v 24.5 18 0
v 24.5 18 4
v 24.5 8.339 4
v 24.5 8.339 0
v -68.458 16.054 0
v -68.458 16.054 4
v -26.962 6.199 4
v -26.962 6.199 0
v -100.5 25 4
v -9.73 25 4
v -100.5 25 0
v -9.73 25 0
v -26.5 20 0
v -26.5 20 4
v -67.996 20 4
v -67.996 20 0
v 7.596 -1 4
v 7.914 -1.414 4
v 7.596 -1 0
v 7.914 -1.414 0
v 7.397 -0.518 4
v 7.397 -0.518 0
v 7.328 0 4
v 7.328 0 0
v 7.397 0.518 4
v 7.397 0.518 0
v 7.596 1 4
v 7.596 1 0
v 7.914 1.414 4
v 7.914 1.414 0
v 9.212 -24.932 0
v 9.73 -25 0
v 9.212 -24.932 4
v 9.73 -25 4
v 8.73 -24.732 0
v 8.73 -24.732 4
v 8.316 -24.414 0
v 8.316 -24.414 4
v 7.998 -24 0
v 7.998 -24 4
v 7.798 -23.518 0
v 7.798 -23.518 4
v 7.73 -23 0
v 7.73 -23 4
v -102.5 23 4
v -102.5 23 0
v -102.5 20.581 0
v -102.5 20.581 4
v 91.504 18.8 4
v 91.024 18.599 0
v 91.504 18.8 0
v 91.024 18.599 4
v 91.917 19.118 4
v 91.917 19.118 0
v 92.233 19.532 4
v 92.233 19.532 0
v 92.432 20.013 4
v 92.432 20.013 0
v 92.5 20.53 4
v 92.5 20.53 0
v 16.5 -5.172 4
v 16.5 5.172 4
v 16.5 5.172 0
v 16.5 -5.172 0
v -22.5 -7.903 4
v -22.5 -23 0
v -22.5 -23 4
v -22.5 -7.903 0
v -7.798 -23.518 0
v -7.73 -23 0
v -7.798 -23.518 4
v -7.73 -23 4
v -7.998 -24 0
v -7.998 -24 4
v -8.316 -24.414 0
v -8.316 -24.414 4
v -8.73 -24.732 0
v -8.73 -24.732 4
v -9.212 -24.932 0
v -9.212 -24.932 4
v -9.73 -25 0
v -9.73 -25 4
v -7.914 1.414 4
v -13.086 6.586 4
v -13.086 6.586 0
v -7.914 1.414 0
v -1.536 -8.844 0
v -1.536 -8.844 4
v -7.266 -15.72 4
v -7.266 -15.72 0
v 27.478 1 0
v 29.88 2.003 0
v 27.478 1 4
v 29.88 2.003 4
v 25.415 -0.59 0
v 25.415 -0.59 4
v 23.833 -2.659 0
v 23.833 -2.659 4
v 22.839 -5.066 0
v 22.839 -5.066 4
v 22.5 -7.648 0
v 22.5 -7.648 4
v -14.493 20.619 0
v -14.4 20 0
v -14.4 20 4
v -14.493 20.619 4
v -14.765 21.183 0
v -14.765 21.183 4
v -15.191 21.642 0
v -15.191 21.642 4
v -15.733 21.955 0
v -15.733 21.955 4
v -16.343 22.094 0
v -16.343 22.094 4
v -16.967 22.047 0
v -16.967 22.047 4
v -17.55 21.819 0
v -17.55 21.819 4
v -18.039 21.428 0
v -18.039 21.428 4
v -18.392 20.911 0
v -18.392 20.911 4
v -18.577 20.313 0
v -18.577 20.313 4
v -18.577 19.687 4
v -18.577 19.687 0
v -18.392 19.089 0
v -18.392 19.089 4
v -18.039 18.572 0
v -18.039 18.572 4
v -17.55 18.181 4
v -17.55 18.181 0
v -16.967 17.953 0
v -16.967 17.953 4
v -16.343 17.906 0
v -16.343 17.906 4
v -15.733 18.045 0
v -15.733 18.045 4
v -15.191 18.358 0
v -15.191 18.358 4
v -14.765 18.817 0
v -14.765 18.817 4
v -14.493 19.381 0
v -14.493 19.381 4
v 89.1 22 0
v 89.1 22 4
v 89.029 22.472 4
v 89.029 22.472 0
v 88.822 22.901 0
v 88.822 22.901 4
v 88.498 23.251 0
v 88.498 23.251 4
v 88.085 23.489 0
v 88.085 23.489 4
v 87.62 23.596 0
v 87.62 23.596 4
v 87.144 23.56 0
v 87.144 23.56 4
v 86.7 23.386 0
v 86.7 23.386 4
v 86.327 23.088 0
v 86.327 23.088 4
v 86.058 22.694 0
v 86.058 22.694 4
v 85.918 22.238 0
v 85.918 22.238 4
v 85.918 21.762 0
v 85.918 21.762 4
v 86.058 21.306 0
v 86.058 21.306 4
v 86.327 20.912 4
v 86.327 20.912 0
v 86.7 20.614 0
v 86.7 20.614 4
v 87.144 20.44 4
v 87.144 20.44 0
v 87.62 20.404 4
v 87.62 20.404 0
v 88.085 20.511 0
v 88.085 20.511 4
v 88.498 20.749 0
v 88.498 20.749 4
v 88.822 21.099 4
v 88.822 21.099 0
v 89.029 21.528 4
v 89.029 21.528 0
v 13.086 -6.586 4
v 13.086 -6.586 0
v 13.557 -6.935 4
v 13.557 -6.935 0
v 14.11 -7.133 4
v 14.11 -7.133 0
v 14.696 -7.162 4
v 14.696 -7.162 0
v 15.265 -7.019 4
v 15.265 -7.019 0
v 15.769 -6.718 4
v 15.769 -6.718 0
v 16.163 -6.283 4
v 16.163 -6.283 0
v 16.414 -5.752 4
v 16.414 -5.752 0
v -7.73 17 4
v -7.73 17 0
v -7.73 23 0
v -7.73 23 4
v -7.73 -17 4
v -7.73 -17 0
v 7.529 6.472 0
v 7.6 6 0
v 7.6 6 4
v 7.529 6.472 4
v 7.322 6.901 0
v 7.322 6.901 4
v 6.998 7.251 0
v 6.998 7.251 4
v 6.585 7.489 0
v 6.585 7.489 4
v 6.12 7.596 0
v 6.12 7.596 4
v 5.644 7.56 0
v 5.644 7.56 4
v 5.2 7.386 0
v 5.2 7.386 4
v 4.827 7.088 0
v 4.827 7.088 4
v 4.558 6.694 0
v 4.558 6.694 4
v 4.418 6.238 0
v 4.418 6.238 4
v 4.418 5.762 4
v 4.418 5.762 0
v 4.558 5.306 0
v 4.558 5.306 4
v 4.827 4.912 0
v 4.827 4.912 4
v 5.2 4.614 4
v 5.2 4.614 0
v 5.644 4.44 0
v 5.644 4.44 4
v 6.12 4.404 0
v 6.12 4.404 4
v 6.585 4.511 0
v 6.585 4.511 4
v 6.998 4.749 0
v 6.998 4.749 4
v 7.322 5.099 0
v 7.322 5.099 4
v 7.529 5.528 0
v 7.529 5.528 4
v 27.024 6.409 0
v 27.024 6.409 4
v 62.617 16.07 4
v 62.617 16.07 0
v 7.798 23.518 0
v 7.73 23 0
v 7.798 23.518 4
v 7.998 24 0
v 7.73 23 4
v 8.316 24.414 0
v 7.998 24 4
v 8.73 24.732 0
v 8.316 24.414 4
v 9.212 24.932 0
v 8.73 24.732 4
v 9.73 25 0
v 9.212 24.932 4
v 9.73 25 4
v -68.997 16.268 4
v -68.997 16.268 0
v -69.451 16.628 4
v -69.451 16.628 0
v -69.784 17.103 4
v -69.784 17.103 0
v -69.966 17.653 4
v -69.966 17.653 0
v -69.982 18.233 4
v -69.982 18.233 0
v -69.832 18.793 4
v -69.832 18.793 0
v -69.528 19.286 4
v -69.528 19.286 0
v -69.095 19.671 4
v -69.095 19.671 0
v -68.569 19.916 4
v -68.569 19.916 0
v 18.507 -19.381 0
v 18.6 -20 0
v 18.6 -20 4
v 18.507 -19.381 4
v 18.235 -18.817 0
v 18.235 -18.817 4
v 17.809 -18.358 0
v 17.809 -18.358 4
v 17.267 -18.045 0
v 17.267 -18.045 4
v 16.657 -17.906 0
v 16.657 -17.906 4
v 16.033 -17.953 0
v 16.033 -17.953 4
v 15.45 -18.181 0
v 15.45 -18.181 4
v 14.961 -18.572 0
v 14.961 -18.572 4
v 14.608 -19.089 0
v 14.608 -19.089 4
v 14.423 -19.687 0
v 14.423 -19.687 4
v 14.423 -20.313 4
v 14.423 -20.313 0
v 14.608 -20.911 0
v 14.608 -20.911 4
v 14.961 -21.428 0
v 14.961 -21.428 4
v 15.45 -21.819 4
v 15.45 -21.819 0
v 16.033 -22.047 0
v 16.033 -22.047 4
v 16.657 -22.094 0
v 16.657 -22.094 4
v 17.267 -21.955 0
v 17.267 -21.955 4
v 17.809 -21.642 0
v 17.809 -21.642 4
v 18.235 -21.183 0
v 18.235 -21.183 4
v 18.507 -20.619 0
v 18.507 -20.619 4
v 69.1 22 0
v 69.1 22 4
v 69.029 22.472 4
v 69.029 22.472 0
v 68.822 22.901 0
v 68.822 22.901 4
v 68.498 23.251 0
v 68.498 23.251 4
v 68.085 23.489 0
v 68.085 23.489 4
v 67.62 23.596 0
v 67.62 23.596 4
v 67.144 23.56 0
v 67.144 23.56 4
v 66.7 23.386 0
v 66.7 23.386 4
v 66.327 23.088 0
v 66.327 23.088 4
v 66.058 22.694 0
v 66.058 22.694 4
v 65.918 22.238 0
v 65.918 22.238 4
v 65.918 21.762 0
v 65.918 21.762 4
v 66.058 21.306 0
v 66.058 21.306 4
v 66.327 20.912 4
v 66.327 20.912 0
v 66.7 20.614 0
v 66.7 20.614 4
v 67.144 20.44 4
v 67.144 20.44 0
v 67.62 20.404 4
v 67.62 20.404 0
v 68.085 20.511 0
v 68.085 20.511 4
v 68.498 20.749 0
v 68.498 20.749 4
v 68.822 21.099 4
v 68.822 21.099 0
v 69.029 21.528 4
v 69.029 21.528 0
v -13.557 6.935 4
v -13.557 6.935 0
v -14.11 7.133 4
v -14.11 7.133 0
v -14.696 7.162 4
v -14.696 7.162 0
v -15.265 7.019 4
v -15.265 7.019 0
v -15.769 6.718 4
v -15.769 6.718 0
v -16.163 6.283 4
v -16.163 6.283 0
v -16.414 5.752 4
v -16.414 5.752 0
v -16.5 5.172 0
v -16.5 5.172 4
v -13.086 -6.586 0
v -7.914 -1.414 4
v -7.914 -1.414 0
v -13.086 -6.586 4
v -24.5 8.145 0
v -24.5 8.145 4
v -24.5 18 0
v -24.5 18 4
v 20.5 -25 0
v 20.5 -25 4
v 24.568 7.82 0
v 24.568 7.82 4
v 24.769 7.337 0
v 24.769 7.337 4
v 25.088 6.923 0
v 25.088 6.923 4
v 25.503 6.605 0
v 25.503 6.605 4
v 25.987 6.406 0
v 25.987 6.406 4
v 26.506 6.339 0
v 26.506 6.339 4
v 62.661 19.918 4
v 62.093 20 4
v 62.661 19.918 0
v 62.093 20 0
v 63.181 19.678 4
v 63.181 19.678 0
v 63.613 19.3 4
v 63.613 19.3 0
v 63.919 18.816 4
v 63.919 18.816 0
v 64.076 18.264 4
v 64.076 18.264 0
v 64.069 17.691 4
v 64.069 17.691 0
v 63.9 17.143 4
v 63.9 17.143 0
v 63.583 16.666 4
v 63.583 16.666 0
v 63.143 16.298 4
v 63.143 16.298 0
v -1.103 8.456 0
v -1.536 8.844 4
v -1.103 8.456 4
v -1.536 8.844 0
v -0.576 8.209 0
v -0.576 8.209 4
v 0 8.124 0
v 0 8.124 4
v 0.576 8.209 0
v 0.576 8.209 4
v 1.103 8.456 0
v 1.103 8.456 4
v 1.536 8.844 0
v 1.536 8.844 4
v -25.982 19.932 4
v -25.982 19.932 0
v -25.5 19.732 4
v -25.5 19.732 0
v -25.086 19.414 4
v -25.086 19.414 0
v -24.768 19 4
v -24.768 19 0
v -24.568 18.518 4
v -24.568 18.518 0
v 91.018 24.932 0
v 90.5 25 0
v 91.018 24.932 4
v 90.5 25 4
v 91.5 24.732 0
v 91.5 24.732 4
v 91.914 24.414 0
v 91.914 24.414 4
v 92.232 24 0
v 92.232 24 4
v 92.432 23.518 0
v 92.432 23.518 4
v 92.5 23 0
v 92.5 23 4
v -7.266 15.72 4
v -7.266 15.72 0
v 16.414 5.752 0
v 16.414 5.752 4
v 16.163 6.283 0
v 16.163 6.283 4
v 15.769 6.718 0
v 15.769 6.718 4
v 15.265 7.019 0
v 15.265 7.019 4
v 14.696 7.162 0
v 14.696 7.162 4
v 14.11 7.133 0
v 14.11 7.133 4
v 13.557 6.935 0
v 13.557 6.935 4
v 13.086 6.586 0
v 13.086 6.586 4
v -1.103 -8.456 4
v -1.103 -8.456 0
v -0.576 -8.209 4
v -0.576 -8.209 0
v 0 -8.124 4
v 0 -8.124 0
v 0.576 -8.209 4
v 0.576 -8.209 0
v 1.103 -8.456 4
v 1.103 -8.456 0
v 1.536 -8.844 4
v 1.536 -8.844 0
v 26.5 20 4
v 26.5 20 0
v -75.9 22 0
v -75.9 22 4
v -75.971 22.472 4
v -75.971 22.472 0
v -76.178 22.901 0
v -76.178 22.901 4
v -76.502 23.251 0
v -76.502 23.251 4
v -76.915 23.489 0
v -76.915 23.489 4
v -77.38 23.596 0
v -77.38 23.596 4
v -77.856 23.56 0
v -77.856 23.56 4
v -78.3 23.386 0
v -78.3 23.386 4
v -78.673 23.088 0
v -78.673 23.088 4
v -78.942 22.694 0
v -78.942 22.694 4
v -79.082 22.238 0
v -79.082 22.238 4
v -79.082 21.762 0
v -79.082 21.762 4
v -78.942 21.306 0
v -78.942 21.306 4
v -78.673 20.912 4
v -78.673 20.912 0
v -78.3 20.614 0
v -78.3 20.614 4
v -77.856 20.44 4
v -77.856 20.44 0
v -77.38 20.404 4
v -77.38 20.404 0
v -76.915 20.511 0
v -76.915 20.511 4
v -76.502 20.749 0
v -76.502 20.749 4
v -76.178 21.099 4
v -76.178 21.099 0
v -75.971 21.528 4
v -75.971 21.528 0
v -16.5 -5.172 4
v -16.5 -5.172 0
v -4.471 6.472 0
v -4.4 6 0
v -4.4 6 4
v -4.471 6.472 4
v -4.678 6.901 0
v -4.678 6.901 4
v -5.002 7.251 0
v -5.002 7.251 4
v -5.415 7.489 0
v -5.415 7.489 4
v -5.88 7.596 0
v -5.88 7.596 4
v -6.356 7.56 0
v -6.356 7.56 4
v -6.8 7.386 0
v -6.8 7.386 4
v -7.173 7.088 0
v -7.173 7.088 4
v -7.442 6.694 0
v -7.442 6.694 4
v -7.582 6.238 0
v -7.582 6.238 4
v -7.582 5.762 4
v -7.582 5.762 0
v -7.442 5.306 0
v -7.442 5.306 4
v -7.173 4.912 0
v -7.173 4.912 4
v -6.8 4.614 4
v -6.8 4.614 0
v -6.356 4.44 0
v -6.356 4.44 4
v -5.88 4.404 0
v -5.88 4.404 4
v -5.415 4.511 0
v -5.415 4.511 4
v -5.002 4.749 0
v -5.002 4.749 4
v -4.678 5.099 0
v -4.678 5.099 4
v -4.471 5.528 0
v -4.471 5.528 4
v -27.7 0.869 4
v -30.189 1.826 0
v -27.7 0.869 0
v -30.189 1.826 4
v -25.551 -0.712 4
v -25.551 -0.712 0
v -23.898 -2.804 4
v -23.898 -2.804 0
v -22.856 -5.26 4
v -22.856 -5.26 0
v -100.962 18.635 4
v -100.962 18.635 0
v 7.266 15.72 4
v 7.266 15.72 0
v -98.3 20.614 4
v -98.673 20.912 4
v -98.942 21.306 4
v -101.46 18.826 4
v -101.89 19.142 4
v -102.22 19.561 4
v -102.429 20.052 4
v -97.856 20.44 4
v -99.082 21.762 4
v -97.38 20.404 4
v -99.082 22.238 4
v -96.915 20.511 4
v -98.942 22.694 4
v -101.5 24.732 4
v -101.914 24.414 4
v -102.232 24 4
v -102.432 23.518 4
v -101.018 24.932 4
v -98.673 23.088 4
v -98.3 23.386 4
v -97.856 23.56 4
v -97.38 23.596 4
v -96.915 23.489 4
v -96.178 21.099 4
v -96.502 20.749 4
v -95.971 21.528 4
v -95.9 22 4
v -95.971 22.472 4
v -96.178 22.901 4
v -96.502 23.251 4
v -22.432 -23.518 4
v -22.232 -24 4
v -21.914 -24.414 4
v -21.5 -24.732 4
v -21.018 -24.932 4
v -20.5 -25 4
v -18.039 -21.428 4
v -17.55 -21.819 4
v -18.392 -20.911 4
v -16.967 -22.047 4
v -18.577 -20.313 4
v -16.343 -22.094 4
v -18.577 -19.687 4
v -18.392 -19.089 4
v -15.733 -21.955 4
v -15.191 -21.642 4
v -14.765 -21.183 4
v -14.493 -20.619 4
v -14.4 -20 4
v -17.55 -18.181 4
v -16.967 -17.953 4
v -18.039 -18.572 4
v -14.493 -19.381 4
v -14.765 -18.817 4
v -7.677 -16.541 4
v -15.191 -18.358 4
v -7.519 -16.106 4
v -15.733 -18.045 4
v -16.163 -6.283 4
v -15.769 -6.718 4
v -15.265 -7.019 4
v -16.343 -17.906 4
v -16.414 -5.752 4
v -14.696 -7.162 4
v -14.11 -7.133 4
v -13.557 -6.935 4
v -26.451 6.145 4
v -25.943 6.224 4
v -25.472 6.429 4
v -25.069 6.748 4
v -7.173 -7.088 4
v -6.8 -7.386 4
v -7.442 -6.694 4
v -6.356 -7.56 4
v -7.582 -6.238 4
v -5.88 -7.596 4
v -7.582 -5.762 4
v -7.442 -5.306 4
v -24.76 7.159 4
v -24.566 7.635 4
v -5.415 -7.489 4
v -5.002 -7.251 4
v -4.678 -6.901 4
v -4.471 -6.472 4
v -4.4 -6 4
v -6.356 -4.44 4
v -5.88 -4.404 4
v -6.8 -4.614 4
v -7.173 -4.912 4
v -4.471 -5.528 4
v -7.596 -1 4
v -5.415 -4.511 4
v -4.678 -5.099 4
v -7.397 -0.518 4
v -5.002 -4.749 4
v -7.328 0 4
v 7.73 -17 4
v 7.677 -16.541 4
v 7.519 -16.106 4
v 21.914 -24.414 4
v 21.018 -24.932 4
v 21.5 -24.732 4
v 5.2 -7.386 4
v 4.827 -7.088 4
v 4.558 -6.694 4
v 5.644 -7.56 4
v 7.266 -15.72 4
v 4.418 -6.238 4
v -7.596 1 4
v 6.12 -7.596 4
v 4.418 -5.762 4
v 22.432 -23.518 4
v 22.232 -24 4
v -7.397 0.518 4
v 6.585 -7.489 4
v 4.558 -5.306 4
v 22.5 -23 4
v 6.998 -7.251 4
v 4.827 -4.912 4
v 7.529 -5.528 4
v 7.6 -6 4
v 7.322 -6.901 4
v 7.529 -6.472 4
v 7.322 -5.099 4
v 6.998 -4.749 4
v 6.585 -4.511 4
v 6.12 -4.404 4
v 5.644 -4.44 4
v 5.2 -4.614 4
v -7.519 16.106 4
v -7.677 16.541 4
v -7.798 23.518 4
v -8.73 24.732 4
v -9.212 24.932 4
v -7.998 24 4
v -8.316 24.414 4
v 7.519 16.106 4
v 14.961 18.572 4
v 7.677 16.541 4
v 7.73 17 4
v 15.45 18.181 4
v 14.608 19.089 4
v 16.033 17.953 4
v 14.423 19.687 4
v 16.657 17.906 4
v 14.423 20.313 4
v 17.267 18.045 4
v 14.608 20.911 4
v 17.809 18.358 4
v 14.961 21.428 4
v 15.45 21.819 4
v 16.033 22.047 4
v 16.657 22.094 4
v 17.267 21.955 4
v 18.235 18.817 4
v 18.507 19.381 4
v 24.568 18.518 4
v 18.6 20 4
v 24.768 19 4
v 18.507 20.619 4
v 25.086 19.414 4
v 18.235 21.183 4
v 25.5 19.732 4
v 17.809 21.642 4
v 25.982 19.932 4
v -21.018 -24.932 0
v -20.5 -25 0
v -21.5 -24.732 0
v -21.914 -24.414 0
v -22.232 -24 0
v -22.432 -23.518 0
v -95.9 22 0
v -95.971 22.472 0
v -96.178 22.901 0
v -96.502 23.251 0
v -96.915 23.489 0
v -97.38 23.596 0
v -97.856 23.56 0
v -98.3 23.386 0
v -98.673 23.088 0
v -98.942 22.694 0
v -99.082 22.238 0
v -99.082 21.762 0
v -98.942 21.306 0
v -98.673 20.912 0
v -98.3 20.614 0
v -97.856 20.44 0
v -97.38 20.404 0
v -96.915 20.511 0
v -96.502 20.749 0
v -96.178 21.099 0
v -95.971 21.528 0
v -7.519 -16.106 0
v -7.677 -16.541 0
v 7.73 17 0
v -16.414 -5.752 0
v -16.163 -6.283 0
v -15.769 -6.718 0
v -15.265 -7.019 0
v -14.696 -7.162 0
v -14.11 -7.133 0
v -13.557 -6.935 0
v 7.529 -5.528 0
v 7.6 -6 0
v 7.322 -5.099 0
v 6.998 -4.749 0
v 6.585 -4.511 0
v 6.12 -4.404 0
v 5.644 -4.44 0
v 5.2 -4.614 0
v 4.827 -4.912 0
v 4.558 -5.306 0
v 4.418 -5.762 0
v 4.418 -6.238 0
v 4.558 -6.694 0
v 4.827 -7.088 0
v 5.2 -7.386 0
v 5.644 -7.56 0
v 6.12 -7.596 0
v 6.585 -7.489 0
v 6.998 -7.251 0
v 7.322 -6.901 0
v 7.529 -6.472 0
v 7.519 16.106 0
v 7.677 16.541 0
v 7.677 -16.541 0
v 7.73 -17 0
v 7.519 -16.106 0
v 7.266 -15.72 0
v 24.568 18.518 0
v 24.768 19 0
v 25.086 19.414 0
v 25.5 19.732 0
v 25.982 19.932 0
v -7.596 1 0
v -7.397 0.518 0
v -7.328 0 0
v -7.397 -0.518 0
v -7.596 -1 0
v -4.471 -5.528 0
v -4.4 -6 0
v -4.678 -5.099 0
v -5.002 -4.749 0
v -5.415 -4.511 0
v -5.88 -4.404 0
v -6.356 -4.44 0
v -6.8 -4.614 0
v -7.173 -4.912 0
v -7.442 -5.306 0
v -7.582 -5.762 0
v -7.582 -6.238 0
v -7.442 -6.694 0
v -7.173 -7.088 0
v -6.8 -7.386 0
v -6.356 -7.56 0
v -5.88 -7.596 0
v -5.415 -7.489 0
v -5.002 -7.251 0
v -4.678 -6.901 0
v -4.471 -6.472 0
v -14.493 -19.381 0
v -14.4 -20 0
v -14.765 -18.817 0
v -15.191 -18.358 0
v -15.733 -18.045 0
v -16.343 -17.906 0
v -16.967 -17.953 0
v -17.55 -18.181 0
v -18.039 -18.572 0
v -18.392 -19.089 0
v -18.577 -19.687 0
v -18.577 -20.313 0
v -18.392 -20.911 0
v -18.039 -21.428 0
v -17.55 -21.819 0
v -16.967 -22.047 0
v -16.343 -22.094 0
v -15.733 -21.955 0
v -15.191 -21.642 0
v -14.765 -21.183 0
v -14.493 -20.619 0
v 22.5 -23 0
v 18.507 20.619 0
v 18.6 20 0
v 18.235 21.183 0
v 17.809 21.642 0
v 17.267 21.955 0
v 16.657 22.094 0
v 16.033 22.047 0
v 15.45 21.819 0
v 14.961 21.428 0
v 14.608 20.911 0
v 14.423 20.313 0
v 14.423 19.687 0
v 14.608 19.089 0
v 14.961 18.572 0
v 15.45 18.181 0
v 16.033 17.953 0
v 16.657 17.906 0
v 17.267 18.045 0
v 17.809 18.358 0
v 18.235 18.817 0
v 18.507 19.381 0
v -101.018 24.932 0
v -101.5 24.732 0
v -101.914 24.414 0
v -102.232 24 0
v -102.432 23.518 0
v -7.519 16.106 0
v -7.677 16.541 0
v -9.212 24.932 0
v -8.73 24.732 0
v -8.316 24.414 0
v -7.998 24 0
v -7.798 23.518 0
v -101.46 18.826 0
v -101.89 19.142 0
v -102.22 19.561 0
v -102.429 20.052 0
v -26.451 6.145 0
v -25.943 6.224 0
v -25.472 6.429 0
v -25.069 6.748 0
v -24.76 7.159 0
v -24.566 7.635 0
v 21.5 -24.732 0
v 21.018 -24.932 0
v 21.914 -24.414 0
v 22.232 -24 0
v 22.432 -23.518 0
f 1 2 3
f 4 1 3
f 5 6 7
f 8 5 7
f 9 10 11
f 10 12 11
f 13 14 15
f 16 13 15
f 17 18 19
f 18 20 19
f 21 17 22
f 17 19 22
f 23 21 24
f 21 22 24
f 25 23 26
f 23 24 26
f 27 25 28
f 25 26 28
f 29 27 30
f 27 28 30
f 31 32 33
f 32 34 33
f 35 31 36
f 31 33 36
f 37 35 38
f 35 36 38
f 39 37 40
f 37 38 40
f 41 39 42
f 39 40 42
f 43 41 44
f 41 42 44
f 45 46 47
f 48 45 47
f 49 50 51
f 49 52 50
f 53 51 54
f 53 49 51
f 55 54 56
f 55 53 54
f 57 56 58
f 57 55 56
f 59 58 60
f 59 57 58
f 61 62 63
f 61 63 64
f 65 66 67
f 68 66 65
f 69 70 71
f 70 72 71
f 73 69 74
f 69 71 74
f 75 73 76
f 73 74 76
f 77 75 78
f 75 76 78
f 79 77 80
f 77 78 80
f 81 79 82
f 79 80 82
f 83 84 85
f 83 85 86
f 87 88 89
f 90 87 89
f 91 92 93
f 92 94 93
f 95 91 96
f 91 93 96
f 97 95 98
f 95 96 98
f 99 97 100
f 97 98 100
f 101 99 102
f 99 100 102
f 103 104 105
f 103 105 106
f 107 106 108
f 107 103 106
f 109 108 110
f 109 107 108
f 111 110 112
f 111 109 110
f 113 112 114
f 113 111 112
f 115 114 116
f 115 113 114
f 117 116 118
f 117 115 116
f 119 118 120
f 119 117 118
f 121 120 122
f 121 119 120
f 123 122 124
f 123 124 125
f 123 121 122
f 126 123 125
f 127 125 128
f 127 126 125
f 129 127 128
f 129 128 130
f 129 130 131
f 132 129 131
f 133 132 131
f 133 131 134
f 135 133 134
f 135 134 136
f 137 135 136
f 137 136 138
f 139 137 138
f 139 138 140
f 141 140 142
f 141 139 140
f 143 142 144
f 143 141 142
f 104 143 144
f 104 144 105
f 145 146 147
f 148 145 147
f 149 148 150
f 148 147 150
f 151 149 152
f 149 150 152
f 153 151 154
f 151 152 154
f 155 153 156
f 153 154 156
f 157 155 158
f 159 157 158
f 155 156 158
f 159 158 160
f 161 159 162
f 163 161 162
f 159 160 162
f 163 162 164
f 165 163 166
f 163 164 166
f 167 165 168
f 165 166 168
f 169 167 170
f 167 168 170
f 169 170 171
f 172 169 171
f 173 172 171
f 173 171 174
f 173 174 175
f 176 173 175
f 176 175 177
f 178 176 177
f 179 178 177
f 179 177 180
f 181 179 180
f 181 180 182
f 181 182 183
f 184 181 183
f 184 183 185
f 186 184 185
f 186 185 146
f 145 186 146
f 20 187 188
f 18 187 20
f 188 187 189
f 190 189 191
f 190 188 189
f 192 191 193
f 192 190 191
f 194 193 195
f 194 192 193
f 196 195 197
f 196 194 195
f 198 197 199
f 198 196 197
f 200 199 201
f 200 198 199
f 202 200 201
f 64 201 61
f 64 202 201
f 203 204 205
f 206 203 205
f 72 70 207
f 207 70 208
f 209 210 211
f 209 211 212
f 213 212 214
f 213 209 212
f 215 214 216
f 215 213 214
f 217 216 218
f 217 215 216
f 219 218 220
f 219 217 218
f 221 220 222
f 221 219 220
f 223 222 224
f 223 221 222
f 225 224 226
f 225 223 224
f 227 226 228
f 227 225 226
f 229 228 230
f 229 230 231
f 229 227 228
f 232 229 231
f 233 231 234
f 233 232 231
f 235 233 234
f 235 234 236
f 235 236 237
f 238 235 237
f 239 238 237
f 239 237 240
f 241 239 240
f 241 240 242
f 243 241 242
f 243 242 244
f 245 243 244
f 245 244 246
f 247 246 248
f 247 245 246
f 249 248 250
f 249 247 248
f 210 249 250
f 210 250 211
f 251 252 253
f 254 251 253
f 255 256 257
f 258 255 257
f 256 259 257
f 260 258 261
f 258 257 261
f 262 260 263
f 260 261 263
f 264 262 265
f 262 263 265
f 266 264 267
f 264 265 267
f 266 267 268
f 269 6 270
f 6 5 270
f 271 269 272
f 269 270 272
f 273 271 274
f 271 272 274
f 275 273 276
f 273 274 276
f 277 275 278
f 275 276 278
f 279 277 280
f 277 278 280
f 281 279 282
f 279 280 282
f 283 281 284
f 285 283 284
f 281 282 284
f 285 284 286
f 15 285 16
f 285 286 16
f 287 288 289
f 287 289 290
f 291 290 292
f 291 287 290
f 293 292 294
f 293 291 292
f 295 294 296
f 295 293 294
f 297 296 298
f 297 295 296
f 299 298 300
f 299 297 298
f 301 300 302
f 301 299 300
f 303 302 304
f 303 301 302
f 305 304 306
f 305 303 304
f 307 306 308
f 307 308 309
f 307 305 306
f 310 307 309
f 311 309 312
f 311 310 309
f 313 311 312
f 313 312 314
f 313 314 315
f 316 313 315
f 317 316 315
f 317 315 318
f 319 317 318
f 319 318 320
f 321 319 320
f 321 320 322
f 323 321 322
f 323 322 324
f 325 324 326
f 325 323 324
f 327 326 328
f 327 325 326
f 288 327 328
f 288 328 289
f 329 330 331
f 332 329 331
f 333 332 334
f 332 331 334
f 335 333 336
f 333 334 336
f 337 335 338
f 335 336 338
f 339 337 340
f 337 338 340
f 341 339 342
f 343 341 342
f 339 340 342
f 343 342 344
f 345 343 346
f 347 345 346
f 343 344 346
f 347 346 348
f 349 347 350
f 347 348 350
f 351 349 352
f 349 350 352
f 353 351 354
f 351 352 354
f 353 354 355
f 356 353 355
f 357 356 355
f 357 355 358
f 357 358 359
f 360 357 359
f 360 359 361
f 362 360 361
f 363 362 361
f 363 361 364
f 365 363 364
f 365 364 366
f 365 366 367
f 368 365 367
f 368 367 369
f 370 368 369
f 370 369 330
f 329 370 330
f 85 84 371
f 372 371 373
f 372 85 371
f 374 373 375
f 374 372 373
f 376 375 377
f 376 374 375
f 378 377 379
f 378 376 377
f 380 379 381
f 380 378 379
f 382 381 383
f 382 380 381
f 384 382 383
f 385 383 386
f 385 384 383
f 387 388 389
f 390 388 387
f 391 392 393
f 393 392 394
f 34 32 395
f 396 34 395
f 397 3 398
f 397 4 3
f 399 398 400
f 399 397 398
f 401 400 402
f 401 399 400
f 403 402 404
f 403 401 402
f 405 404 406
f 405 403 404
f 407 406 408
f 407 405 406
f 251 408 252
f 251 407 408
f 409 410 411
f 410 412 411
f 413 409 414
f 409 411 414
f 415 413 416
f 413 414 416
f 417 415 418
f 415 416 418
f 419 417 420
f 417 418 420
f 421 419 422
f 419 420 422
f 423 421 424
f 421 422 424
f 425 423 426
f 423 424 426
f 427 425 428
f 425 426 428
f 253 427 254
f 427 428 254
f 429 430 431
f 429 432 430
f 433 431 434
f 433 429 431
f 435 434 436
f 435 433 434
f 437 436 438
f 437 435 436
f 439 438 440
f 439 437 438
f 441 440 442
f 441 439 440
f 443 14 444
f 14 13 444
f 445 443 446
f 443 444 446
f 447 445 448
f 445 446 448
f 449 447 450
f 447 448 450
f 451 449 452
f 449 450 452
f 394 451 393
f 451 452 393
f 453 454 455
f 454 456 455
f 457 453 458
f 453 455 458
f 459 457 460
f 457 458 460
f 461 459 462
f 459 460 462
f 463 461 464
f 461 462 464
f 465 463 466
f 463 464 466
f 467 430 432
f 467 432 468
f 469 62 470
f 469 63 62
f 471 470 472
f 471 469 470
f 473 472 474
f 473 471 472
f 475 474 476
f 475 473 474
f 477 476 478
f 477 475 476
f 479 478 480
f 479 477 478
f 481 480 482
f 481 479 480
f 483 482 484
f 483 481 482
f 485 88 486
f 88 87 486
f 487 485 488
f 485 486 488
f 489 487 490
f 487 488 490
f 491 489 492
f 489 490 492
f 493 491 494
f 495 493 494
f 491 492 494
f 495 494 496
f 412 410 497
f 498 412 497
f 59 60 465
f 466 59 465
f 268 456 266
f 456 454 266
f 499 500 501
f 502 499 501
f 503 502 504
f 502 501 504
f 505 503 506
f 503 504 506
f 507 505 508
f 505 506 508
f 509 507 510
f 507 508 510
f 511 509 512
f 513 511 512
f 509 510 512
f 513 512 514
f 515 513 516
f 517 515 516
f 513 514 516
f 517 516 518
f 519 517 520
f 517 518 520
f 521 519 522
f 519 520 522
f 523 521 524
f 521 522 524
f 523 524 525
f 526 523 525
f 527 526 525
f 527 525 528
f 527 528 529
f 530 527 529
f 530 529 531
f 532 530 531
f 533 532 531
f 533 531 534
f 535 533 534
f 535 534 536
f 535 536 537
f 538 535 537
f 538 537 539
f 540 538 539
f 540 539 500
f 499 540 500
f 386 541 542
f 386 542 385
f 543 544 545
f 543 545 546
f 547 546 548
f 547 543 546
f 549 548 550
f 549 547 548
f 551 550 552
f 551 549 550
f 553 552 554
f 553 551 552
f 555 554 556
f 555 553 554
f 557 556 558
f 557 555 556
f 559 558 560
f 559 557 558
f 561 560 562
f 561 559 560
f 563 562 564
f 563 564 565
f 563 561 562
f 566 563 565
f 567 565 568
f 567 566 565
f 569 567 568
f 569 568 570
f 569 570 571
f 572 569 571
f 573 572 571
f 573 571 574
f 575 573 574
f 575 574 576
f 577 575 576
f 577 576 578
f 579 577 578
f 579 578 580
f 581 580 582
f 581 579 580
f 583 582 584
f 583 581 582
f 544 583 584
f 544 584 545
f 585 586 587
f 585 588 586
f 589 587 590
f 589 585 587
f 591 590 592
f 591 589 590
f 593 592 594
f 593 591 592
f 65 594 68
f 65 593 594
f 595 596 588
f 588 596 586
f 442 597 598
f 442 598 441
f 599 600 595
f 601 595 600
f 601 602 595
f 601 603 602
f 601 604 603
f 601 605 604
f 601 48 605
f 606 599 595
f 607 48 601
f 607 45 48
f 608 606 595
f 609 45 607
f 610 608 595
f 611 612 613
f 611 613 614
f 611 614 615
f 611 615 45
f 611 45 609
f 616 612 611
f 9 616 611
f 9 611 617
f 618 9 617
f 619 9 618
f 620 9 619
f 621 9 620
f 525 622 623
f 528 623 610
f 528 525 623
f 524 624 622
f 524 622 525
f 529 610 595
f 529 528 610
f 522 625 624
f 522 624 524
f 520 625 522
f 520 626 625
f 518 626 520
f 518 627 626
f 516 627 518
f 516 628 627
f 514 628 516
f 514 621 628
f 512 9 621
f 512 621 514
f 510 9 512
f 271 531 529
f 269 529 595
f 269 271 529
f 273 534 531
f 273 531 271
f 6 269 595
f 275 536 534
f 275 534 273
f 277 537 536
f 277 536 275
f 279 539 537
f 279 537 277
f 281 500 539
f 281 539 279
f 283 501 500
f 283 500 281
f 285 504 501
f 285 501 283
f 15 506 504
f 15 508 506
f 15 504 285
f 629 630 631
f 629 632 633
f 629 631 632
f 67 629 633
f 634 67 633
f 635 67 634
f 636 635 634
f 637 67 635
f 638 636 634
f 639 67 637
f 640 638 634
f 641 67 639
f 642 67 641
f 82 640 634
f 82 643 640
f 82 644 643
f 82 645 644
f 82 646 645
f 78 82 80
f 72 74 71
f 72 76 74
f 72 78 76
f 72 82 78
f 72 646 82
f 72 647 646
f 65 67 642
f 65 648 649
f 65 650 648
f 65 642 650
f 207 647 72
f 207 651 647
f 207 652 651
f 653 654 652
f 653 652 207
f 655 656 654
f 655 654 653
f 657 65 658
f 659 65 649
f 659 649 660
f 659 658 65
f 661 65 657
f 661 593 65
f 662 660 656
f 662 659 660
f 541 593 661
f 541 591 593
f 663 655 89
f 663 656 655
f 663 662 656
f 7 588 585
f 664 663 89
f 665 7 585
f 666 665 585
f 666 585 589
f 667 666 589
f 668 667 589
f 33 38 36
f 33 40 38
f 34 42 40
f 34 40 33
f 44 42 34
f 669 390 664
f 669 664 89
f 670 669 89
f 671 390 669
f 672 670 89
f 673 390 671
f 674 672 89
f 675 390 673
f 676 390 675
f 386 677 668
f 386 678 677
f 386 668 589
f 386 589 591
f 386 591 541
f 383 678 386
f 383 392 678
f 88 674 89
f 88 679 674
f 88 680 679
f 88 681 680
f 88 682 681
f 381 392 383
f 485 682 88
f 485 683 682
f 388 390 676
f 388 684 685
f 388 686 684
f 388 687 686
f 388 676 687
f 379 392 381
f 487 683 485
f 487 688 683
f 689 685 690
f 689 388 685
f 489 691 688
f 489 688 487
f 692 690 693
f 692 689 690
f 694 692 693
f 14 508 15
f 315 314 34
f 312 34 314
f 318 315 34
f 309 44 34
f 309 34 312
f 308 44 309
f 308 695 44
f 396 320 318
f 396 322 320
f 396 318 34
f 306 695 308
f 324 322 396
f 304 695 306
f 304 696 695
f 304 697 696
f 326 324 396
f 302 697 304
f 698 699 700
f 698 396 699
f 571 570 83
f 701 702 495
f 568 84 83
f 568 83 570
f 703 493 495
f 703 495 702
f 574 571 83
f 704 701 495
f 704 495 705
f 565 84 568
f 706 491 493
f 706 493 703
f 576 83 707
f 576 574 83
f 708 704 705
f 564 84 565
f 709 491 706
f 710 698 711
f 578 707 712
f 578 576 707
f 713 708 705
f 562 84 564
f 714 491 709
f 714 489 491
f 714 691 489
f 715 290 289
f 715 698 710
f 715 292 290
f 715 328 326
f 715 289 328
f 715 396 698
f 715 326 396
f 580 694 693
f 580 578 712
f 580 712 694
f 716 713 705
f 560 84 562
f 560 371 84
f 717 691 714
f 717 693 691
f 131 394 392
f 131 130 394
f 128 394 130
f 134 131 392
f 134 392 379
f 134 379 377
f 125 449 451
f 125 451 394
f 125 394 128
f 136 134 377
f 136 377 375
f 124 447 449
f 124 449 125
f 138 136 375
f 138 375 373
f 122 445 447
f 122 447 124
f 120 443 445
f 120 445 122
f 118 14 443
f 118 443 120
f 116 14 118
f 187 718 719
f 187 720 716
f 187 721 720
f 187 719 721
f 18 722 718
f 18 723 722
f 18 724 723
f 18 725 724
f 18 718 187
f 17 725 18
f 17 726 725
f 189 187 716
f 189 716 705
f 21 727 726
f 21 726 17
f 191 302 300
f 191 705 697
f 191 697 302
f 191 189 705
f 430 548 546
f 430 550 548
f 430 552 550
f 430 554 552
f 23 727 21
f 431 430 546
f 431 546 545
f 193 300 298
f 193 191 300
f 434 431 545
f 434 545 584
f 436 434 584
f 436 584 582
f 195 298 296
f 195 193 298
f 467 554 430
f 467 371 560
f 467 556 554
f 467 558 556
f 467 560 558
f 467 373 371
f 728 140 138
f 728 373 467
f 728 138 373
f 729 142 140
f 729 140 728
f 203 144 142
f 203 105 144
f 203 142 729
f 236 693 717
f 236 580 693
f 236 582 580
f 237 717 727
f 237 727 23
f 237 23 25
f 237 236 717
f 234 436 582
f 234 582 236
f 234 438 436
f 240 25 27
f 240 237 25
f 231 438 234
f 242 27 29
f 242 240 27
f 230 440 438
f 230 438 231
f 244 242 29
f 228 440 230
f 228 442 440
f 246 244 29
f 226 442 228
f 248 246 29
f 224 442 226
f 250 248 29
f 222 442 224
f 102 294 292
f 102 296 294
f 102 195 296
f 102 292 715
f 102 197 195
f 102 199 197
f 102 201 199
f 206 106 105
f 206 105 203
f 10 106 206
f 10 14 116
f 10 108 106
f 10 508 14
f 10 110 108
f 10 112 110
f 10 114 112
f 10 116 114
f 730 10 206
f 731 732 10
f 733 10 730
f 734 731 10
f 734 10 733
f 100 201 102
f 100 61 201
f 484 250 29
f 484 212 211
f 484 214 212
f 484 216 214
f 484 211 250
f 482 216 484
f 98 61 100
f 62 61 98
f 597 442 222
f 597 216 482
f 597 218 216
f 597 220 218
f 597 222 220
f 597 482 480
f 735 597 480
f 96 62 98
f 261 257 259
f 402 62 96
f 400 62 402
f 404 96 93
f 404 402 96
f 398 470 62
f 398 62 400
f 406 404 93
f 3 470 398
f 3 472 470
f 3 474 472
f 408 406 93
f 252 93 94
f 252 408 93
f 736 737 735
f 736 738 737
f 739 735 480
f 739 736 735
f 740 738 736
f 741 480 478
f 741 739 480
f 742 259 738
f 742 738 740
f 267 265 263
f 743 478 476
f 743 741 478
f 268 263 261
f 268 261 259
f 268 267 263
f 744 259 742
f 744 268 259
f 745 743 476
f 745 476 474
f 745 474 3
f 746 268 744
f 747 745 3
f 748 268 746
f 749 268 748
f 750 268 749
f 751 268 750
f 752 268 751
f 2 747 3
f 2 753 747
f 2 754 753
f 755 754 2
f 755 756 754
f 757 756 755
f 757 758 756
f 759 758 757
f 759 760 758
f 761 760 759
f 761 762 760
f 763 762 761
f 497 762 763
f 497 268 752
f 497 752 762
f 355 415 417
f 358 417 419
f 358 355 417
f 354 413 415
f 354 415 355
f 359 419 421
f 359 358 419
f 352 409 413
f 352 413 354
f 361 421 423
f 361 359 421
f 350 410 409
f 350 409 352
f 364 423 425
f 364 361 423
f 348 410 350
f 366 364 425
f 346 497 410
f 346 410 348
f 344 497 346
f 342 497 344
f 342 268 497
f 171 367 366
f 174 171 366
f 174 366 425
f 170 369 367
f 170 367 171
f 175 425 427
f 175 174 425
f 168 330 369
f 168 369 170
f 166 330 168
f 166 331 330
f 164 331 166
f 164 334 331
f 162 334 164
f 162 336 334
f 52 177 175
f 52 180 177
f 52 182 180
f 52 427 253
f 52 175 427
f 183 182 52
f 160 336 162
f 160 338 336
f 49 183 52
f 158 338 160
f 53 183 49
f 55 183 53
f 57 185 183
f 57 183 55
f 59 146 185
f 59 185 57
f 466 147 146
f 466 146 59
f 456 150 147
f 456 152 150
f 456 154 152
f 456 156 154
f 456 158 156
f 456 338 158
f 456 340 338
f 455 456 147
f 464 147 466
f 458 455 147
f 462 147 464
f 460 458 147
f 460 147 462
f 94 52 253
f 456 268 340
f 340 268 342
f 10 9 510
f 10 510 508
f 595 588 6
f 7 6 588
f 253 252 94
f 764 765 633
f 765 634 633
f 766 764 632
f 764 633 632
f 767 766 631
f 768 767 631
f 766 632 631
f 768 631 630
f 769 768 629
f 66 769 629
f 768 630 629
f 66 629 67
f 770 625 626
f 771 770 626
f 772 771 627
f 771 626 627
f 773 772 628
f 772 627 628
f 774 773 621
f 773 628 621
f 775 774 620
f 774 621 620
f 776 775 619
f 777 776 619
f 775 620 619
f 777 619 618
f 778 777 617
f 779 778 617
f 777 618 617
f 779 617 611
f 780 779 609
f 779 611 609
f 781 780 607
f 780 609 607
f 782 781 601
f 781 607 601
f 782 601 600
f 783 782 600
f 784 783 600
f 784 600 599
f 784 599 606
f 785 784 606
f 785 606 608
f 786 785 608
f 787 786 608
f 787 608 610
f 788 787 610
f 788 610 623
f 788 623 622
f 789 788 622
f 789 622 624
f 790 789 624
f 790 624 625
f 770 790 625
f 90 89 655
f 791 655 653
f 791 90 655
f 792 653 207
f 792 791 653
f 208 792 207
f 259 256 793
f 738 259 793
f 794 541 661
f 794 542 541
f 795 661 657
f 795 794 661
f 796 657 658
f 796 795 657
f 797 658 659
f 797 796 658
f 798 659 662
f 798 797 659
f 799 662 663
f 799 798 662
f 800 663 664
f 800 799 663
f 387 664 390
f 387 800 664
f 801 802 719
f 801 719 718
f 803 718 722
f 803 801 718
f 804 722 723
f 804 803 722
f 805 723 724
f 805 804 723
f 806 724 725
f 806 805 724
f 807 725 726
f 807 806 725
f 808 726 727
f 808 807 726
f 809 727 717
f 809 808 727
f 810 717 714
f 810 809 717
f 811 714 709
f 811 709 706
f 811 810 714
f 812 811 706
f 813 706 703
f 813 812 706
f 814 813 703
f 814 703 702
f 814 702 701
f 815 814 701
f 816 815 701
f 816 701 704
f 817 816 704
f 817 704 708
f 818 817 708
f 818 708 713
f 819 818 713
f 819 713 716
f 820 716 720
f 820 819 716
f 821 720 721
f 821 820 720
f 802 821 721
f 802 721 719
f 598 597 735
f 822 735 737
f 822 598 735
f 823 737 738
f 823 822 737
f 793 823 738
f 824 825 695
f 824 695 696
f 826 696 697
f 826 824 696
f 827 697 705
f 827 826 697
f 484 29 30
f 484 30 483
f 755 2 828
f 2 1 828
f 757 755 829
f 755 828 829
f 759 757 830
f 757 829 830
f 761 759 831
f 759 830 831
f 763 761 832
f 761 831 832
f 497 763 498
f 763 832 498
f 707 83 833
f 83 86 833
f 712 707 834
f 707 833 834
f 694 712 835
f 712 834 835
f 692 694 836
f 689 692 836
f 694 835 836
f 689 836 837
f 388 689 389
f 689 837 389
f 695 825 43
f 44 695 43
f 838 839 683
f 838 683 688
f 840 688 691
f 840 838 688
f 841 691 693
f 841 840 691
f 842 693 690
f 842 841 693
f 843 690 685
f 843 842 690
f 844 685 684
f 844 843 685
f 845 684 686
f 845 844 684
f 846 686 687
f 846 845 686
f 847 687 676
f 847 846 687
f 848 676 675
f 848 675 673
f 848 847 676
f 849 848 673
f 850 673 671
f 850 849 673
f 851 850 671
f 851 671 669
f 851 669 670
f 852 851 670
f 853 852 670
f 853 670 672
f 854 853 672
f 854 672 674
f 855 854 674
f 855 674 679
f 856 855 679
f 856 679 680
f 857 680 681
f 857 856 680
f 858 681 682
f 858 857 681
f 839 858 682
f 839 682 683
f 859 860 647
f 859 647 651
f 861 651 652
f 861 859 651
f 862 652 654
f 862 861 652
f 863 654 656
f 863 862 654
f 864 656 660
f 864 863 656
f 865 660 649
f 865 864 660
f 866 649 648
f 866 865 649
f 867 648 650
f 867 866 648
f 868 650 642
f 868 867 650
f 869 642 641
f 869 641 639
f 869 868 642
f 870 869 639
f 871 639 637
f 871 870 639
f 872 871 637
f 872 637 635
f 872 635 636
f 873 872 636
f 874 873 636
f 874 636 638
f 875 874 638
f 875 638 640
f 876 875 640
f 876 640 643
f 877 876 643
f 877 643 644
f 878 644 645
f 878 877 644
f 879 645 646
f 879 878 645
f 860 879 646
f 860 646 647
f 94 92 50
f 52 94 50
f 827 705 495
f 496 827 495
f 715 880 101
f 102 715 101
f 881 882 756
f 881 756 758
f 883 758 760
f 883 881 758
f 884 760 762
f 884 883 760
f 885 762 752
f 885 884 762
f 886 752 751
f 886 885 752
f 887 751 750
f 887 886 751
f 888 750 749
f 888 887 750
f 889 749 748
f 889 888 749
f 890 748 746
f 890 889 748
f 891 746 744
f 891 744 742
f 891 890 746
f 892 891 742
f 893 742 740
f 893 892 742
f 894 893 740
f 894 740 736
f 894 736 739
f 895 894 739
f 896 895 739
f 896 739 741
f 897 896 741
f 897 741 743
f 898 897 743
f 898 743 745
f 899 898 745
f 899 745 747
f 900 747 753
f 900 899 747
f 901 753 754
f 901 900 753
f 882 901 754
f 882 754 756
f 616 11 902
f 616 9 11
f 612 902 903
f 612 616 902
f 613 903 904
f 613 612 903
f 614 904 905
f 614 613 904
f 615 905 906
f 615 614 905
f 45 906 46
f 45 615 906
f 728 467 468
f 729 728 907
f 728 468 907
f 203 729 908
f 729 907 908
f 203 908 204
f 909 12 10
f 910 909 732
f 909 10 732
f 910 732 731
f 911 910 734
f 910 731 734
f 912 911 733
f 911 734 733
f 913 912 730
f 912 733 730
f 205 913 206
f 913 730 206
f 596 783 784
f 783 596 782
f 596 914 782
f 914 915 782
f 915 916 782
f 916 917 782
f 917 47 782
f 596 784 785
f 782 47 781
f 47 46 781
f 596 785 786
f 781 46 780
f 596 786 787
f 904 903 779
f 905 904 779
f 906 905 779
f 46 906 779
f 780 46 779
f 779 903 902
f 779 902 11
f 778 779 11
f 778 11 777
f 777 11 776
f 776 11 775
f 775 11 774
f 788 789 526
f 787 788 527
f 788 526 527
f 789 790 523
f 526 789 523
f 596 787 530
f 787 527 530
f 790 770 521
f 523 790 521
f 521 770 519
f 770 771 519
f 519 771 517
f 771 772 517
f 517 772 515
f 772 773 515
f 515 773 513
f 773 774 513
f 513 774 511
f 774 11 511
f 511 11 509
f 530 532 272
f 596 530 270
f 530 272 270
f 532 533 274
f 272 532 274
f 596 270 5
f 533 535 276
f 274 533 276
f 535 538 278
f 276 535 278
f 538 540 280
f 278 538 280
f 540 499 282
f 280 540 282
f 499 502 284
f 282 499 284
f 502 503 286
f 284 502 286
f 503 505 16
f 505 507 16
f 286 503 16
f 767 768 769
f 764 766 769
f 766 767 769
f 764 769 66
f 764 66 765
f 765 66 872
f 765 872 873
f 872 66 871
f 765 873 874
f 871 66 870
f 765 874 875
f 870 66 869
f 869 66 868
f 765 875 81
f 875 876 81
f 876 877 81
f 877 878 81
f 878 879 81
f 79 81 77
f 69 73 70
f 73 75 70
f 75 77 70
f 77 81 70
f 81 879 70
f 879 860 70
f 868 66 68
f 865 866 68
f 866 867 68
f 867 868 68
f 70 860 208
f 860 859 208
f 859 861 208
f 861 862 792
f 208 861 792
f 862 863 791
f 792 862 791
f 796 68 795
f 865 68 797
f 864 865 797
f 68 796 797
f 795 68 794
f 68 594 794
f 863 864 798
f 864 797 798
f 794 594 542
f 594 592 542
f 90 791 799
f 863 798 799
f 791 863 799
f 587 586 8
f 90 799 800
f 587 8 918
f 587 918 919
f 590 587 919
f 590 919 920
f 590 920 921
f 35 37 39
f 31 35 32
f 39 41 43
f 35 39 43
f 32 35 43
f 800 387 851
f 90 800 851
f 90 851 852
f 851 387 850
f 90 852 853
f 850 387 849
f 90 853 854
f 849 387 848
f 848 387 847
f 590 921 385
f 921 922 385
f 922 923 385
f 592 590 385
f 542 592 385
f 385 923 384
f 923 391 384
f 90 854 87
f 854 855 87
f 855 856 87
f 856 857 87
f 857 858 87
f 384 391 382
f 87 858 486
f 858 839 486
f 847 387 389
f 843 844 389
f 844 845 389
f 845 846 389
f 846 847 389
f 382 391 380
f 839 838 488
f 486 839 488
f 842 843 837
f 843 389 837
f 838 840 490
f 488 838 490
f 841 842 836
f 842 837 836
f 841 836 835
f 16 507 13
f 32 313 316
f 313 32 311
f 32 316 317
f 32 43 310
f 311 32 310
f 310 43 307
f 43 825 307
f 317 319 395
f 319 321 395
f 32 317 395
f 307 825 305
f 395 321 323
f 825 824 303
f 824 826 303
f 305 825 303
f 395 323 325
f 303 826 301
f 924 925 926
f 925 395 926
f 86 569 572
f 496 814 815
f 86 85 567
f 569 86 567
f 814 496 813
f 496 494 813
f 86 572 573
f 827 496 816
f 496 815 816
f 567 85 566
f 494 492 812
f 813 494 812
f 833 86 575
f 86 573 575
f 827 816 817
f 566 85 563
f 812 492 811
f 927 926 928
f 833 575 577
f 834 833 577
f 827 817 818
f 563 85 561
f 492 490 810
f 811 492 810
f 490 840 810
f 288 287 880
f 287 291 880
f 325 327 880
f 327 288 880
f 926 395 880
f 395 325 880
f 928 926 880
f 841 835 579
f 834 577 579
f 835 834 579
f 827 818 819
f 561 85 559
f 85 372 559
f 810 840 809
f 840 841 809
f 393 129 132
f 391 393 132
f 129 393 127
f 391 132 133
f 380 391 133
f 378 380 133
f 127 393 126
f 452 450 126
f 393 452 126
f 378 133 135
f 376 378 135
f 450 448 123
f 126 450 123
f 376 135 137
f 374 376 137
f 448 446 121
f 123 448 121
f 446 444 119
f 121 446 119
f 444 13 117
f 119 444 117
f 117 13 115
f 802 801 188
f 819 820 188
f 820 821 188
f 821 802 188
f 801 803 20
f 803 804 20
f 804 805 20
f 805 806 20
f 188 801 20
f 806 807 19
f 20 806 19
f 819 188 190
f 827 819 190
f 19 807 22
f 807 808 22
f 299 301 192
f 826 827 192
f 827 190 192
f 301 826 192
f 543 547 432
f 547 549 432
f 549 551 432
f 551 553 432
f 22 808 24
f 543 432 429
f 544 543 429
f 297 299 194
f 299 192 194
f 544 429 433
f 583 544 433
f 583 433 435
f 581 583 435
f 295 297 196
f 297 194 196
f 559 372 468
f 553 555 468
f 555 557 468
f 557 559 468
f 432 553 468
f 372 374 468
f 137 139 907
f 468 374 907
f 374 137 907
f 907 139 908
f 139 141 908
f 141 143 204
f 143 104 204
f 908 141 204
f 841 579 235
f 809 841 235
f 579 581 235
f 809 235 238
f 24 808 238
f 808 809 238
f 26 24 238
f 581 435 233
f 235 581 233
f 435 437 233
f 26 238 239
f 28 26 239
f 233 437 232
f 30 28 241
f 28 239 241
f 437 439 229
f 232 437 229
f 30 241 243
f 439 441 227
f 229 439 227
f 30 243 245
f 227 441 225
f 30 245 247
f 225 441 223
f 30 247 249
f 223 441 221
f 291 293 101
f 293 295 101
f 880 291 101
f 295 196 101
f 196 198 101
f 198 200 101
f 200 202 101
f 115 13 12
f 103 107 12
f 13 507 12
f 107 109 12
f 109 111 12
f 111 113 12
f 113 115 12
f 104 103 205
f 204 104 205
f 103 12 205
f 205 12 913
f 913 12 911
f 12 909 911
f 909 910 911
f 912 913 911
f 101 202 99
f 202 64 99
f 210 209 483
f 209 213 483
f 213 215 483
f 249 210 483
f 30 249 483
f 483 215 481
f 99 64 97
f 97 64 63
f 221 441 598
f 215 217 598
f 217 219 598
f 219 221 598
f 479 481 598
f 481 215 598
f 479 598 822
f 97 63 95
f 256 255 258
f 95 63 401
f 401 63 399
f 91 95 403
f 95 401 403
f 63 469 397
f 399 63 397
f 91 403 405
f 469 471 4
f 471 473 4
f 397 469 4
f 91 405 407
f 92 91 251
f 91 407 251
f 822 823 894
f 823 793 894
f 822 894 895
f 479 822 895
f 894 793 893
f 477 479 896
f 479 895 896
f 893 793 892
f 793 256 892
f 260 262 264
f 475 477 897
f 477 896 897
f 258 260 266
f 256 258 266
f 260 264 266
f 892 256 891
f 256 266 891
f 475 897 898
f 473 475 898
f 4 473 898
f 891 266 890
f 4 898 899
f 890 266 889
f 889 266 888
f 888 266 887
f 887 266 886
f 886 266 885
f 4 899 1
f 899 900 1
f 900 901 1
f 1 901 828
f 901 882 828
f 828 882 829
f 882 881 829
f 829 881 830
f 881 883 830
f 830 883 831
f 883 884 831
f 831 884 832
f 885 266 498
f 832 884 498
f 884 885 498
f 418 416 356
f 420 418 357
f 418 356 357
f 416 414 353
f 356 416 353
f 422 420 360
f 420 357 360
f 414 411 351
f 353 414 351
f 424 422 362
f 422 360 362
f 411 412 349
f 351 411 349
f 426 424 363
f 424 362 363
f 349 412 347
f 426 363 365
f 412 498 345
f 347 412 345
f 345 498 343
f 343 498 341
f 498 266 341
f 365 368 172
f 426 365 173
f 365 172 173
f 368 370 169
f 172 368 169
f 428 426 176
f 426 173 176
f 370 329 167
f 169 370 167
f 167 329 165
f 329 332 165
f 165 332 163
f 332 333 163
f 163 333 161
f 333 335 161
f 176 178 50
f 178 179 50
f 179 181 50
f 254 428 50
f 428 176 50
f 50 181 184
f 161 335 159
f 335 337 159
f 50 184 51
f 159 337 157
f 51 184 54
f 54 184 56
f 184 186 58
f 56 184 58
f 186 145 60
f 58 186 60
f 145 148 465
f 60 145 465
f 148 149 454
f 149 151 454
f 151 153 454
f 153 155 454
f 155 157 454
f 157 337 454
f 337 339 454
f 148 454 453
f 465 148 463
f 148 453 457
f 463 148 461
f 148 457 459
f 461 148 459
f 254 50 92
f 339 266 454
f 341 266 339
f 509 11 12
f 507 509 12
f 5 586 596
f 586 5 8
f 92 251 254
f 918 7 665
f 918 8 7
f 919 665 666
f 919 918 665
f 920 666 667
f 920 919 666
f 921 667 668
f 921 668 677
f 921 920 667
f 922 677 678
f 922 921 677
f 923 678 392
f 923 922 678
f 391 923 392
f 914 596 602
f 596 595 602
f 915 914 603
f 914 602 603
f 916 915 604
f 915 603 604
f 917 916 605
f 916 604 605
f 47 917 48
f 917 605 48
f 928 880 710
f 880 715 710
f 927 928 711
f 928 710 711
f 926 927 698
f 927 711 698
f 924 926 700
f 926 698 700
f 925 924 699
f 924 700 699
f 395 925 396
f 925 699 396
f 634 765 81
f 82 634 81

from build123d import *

# Parameters (mm, degrees)
SKETCH_1_W          = 45
SKETCH_1_H          = 50
SKETCH_1_R          = 1.6
SKETCH_1_R_2        = 2.1
EXTRUDE_1_DEPTH     = 4
FILLET_1_R          = 2
FILLET_2_R          = 10
CUT_EXTRUDE_1_DEPTH = 10
FILLET_3_R          = 2
SKETCH_3_W          = 5.729916775
SKETCH_3_H          = 6
CUT_EXTRUDE_2_DEPTH = 10
CUT_EXTRUDE_3_DEPTH = 10
FILLET_4_R          = 2
CUT_EXTRUDE_4_DEPTH = 10
FILLET_5_R          = 2
CUT_EXTRUDE_5_DEPTH = 10
SKETCH_8_R          = 1.6
CUT_EXTRUDE_6_DEPTH = 10
SKETCH_9_R          = 1.6
CUT_EXTRUDE_7_DEPTH = 10
FILLET_8_R          = 2


with BuildPart() as part:
    # 草图1 → 凸台-拉伸1 (new body)
    # profile 1 of 3: a face of its own
    with BuildSketch(Plane.XY):
        Polygon((-102.5, 25), (-102.5, 19), (-22.5, 0), (-22.5, 25), align=None)
    # profile 2 of 3: a face of its own
    with BuildSketch(Plane.XY):
        Rectangle(SKETCH_1_W, SKETCH_1_H)
        with Locations((-6, -6)):
            Circle(SKETCH_1_R, mode=Mode.SUBTRACT)
        with Locations((6, -6)):
            Circle(SKETCH_1_R, mode=Mode.SUBTRACT)
        with Locations((6, 6)):
            Circle(SKETCH_1_R, mode=Mode.SUBTRACT)
        with Locations((-6, 6)):
            Circle(SKETCH_1_R, mode=Mode.SUBTRACT)
        with Locations((-16.5, -20)):
            Circle(SKETCH_1_R_2, mode=Mode.SUBTRACT)
        with Locations((16.5, -20)):
            Circle(SKETCH_1_R_2, mode=Mode.SUBTRACT)
        with Locations((16.5, 20)):
            Circle(SKETCH_1_R_2, mode=Mode.SUBTRACT)
        with Locations((-16.5, 20)):
            Circle(SKETCH_1_R_2, mode=Mode.SUBTRACT)
    # profile 3 of 3: a face of its own
    with BuildSketch(Plane.XY):
        Polygon((92.5, 25), (22.5, 25), (22.5, 0), (92.5, 19), align=None)
    extrude(amount=EXTRUDE_1_DEPTH)

    # 圆角1
    fillet_1_edges = [part.edges().sort_by_distance(p)[0] for p in [
        (92.5, 25, 2),
        (92.5, 19, 2),
        (22.5, -25, 2),
        (-22.5, -25, 2),
        (-102.5, 19, 2),
        (-102.5, 25, 2),
    ]]
    fillet(fillet_1_edges, radius=FILLET_1_R)

    # 圆角2
    fillet_2_edges = [part.edges().sort_by_distance(p)[0] for p in [
        (22.5, 0, 2),
        (-22.5, 0, 2),
    ]]
    fillet(fillet_2_edges, radius=FILLET_2_R)

    # 草图2 → 切除-拉伸1 (cut)
    with BuildSketch(Plane.XY.offset(4)):
        Polygon((-10, 19), (10, 19), (0, 7), align=None)
        Polygon((0, -7), (-10, -19), (10, -19), align=None)
    extrude(amount=-CUT_EXTRUDE_1_DEPTH, mode=Mode.SUBTRACT)

    # 圆角3
    fillet_3_edges = [part.edges().sort_by_distance(p)[0] for p in [
        (0, 7, 2),
        (-10, 19, 2),
        (10, 19, 2),
        (10, -19, 2),
        (-10, -19, 2),
        (0, -7, 2),
    ]]
    fillet(fillet_3_edges, radius=FILLET_3_R)

    # 草图3 → 切除-拉伸2 (cut)
    with BuildSketch(Plane(origin=(0, 0, 0), x_dir=(-1, 0, 0), z_dir=(0, 0, -1))):
        with Locations((2.864958388, 22)):
            Rectangle(SKETCH_3_W, SKETCH_3_H)
        with Locations((-2.864958388, 22)):
            Rectangle(SKETCH_3_W, SKETCH_3_H)
        with Locations((2.864958388, -22)):
            Rectangle(SKETCH_3_W, SKETCH_3_H)
        with Locations((-2.864958388, -22)):
            Rectangle(SKETCH_3_W, SKETCH_3_H)
    extrude(amount=-CUT_EXTRUDE_2_DEPTH, mode=Mode.SUBTRACT)

    # 草图4 → 切除-拉伸3 (cut)
    with BuildSketch(Plane(origin=(0, 0, 0), x_dir=(-1, 0, 0), z_dir=(0, 0, -1))):
        with BuildLine():
            Line((-5.729916775, 25), (-7.729916775, 25))
            Line((-7.729916775, 25), (-7.729916775, 17))
            ThreePointArc((-7.729916775, 17), (-7.144130337, 18.414213562), (-5.729916775, 19))
            Line((-5.729916775, 19), (-5.729916775, 25))
        make_face()
        with BuildLine():
            Line((7.729916775, 25), (5.729916775, 25))
            Line((5.729916775, 25), (5.729916775, 19))
            ThreePointArc((5.729916775, 19), (7.144130337, 18.414213562), (7.729916775, 17))
            Line((7.729916775, 17), (7.729916775, 25))
        make_face()
        with BuildLine():
            Line((-7.729916775, -17), (-7.729916775, -25))
            Line((-7.729916775, -25), (-5.729916775, -25))
            Line((-5.729916775, -25), (-5.729916775, -19))
            ThreePointArc((-5.729916775, -19), (-7.144130337, -18.414213562), (-7.729916775, -17))
        make_face()
        with BuildLine():
            Line((5.729916775, -19), (5.729916775, -25))
            Line((5.729916775, -25), (7.729916775, -25))
            Line((7.729916775, -25), (7.729916775, -17))
            ThreePointArc((7.729916775, -17), (7.144130337, -18.414213562), (5.729916775, -19))
        make_face()
    extrude(amount=-CUT_EXTRUDE_3_DEPTH, mode=Mode.SUBTRACT)

    # 圆角4
    fillet_4_edges = [part.edges().sort_by_distance(p)[0] for p in [
        (7.729916775, 25, 2),
        (-7.729916775, 25, 2),
        (-7.729916775, -25, 2),
        (7.729916775, -25, 2),
    ]]
    fillet(fillet_4_edges, radius=FILLET_4_R)

    # 草图6 → 切除-拉伸4 (cut)
    with BuildSketch(Plane.XY.offset(4)):
        Polygon((6.5, 0), (16.5, 10), (16.5, -10), align=None)
        Polygon((-6.5, 0), (-16.5, -10), (-16.5, 10), align=None)
    extrude(amount=-CUT_EXTRUDE_4_DEPTH, mode=Mode.SUBTRACT)

    # 圆角5
    fillet_5_edges = [part.edges().sort_by_distance(p)[0] for p in [
        (16.5, -10, 2),
        (6.5, 0, 2),
        (16.5, 10, 2),
        (-16.5, 10, 2),
        (-6.5, 0, 2),
        (-16.5, -10, 2),
    ]]
    fillet(fillet_5_edges, radius=FILLET_5_R)

    # 草图7 → 切除-拉伸5 (cut)
    with BuildSketch(Plane.XY.offset(4)):
        Polygon((-85.07228941, 20), (-24.5, 5.614081265), (-24.5, 20), align=None)
        Polygon((24.5, 20), (24.5, 5.723767945), (77.096644415, 20), align=None)
    extrude(amount=-CUT_EXTRUDE_5_DEPTH, mode=Mode.SUBTRACT)

    # 草图8 → 切除-拉伸6 (cut)
    with BuildSketch(Plane.XY.offset(4)):
        with Locations((-97.5, 22)):
            Circle(SKETCH_8_R)
        with Locations((-77.5, 22)):
            Circle(SKETCH_8_R)
    extrude(amount=-CUT_EXTRUDE_6_DEPTH, mode=Mode.SUBTRACT)

    # 草图9 → 切除-拉伸7 (cut)
    with BuildSketch(Plane.XY.offset(4)):
        with Locations((87.5, 22)):
            Circle(SKETCH_9_R)
        with Locations((67.5, 22)):
            Circle(SKETCH_9_R)
    extrude(amount=-CUT_EXTRUDE_7_DEPTH, mode=Mode.SUBTRACT)

    # 圆角8
    fillet_8_edges = [part.edges().sort_by_distance(p)[0] for p in [
        (-85.07228941, 20, 2),
        (-24.5, 20, 2),
        (-24.5, 5.614081265, 2),
        (24.5, 20, 2),
        (77.096644415, 20, 2),
        (24.5, 5.723767945, 2),
    ]]
    fillet(fillet_8_edges, radius=FILLET_8_R)


solid = part.part
